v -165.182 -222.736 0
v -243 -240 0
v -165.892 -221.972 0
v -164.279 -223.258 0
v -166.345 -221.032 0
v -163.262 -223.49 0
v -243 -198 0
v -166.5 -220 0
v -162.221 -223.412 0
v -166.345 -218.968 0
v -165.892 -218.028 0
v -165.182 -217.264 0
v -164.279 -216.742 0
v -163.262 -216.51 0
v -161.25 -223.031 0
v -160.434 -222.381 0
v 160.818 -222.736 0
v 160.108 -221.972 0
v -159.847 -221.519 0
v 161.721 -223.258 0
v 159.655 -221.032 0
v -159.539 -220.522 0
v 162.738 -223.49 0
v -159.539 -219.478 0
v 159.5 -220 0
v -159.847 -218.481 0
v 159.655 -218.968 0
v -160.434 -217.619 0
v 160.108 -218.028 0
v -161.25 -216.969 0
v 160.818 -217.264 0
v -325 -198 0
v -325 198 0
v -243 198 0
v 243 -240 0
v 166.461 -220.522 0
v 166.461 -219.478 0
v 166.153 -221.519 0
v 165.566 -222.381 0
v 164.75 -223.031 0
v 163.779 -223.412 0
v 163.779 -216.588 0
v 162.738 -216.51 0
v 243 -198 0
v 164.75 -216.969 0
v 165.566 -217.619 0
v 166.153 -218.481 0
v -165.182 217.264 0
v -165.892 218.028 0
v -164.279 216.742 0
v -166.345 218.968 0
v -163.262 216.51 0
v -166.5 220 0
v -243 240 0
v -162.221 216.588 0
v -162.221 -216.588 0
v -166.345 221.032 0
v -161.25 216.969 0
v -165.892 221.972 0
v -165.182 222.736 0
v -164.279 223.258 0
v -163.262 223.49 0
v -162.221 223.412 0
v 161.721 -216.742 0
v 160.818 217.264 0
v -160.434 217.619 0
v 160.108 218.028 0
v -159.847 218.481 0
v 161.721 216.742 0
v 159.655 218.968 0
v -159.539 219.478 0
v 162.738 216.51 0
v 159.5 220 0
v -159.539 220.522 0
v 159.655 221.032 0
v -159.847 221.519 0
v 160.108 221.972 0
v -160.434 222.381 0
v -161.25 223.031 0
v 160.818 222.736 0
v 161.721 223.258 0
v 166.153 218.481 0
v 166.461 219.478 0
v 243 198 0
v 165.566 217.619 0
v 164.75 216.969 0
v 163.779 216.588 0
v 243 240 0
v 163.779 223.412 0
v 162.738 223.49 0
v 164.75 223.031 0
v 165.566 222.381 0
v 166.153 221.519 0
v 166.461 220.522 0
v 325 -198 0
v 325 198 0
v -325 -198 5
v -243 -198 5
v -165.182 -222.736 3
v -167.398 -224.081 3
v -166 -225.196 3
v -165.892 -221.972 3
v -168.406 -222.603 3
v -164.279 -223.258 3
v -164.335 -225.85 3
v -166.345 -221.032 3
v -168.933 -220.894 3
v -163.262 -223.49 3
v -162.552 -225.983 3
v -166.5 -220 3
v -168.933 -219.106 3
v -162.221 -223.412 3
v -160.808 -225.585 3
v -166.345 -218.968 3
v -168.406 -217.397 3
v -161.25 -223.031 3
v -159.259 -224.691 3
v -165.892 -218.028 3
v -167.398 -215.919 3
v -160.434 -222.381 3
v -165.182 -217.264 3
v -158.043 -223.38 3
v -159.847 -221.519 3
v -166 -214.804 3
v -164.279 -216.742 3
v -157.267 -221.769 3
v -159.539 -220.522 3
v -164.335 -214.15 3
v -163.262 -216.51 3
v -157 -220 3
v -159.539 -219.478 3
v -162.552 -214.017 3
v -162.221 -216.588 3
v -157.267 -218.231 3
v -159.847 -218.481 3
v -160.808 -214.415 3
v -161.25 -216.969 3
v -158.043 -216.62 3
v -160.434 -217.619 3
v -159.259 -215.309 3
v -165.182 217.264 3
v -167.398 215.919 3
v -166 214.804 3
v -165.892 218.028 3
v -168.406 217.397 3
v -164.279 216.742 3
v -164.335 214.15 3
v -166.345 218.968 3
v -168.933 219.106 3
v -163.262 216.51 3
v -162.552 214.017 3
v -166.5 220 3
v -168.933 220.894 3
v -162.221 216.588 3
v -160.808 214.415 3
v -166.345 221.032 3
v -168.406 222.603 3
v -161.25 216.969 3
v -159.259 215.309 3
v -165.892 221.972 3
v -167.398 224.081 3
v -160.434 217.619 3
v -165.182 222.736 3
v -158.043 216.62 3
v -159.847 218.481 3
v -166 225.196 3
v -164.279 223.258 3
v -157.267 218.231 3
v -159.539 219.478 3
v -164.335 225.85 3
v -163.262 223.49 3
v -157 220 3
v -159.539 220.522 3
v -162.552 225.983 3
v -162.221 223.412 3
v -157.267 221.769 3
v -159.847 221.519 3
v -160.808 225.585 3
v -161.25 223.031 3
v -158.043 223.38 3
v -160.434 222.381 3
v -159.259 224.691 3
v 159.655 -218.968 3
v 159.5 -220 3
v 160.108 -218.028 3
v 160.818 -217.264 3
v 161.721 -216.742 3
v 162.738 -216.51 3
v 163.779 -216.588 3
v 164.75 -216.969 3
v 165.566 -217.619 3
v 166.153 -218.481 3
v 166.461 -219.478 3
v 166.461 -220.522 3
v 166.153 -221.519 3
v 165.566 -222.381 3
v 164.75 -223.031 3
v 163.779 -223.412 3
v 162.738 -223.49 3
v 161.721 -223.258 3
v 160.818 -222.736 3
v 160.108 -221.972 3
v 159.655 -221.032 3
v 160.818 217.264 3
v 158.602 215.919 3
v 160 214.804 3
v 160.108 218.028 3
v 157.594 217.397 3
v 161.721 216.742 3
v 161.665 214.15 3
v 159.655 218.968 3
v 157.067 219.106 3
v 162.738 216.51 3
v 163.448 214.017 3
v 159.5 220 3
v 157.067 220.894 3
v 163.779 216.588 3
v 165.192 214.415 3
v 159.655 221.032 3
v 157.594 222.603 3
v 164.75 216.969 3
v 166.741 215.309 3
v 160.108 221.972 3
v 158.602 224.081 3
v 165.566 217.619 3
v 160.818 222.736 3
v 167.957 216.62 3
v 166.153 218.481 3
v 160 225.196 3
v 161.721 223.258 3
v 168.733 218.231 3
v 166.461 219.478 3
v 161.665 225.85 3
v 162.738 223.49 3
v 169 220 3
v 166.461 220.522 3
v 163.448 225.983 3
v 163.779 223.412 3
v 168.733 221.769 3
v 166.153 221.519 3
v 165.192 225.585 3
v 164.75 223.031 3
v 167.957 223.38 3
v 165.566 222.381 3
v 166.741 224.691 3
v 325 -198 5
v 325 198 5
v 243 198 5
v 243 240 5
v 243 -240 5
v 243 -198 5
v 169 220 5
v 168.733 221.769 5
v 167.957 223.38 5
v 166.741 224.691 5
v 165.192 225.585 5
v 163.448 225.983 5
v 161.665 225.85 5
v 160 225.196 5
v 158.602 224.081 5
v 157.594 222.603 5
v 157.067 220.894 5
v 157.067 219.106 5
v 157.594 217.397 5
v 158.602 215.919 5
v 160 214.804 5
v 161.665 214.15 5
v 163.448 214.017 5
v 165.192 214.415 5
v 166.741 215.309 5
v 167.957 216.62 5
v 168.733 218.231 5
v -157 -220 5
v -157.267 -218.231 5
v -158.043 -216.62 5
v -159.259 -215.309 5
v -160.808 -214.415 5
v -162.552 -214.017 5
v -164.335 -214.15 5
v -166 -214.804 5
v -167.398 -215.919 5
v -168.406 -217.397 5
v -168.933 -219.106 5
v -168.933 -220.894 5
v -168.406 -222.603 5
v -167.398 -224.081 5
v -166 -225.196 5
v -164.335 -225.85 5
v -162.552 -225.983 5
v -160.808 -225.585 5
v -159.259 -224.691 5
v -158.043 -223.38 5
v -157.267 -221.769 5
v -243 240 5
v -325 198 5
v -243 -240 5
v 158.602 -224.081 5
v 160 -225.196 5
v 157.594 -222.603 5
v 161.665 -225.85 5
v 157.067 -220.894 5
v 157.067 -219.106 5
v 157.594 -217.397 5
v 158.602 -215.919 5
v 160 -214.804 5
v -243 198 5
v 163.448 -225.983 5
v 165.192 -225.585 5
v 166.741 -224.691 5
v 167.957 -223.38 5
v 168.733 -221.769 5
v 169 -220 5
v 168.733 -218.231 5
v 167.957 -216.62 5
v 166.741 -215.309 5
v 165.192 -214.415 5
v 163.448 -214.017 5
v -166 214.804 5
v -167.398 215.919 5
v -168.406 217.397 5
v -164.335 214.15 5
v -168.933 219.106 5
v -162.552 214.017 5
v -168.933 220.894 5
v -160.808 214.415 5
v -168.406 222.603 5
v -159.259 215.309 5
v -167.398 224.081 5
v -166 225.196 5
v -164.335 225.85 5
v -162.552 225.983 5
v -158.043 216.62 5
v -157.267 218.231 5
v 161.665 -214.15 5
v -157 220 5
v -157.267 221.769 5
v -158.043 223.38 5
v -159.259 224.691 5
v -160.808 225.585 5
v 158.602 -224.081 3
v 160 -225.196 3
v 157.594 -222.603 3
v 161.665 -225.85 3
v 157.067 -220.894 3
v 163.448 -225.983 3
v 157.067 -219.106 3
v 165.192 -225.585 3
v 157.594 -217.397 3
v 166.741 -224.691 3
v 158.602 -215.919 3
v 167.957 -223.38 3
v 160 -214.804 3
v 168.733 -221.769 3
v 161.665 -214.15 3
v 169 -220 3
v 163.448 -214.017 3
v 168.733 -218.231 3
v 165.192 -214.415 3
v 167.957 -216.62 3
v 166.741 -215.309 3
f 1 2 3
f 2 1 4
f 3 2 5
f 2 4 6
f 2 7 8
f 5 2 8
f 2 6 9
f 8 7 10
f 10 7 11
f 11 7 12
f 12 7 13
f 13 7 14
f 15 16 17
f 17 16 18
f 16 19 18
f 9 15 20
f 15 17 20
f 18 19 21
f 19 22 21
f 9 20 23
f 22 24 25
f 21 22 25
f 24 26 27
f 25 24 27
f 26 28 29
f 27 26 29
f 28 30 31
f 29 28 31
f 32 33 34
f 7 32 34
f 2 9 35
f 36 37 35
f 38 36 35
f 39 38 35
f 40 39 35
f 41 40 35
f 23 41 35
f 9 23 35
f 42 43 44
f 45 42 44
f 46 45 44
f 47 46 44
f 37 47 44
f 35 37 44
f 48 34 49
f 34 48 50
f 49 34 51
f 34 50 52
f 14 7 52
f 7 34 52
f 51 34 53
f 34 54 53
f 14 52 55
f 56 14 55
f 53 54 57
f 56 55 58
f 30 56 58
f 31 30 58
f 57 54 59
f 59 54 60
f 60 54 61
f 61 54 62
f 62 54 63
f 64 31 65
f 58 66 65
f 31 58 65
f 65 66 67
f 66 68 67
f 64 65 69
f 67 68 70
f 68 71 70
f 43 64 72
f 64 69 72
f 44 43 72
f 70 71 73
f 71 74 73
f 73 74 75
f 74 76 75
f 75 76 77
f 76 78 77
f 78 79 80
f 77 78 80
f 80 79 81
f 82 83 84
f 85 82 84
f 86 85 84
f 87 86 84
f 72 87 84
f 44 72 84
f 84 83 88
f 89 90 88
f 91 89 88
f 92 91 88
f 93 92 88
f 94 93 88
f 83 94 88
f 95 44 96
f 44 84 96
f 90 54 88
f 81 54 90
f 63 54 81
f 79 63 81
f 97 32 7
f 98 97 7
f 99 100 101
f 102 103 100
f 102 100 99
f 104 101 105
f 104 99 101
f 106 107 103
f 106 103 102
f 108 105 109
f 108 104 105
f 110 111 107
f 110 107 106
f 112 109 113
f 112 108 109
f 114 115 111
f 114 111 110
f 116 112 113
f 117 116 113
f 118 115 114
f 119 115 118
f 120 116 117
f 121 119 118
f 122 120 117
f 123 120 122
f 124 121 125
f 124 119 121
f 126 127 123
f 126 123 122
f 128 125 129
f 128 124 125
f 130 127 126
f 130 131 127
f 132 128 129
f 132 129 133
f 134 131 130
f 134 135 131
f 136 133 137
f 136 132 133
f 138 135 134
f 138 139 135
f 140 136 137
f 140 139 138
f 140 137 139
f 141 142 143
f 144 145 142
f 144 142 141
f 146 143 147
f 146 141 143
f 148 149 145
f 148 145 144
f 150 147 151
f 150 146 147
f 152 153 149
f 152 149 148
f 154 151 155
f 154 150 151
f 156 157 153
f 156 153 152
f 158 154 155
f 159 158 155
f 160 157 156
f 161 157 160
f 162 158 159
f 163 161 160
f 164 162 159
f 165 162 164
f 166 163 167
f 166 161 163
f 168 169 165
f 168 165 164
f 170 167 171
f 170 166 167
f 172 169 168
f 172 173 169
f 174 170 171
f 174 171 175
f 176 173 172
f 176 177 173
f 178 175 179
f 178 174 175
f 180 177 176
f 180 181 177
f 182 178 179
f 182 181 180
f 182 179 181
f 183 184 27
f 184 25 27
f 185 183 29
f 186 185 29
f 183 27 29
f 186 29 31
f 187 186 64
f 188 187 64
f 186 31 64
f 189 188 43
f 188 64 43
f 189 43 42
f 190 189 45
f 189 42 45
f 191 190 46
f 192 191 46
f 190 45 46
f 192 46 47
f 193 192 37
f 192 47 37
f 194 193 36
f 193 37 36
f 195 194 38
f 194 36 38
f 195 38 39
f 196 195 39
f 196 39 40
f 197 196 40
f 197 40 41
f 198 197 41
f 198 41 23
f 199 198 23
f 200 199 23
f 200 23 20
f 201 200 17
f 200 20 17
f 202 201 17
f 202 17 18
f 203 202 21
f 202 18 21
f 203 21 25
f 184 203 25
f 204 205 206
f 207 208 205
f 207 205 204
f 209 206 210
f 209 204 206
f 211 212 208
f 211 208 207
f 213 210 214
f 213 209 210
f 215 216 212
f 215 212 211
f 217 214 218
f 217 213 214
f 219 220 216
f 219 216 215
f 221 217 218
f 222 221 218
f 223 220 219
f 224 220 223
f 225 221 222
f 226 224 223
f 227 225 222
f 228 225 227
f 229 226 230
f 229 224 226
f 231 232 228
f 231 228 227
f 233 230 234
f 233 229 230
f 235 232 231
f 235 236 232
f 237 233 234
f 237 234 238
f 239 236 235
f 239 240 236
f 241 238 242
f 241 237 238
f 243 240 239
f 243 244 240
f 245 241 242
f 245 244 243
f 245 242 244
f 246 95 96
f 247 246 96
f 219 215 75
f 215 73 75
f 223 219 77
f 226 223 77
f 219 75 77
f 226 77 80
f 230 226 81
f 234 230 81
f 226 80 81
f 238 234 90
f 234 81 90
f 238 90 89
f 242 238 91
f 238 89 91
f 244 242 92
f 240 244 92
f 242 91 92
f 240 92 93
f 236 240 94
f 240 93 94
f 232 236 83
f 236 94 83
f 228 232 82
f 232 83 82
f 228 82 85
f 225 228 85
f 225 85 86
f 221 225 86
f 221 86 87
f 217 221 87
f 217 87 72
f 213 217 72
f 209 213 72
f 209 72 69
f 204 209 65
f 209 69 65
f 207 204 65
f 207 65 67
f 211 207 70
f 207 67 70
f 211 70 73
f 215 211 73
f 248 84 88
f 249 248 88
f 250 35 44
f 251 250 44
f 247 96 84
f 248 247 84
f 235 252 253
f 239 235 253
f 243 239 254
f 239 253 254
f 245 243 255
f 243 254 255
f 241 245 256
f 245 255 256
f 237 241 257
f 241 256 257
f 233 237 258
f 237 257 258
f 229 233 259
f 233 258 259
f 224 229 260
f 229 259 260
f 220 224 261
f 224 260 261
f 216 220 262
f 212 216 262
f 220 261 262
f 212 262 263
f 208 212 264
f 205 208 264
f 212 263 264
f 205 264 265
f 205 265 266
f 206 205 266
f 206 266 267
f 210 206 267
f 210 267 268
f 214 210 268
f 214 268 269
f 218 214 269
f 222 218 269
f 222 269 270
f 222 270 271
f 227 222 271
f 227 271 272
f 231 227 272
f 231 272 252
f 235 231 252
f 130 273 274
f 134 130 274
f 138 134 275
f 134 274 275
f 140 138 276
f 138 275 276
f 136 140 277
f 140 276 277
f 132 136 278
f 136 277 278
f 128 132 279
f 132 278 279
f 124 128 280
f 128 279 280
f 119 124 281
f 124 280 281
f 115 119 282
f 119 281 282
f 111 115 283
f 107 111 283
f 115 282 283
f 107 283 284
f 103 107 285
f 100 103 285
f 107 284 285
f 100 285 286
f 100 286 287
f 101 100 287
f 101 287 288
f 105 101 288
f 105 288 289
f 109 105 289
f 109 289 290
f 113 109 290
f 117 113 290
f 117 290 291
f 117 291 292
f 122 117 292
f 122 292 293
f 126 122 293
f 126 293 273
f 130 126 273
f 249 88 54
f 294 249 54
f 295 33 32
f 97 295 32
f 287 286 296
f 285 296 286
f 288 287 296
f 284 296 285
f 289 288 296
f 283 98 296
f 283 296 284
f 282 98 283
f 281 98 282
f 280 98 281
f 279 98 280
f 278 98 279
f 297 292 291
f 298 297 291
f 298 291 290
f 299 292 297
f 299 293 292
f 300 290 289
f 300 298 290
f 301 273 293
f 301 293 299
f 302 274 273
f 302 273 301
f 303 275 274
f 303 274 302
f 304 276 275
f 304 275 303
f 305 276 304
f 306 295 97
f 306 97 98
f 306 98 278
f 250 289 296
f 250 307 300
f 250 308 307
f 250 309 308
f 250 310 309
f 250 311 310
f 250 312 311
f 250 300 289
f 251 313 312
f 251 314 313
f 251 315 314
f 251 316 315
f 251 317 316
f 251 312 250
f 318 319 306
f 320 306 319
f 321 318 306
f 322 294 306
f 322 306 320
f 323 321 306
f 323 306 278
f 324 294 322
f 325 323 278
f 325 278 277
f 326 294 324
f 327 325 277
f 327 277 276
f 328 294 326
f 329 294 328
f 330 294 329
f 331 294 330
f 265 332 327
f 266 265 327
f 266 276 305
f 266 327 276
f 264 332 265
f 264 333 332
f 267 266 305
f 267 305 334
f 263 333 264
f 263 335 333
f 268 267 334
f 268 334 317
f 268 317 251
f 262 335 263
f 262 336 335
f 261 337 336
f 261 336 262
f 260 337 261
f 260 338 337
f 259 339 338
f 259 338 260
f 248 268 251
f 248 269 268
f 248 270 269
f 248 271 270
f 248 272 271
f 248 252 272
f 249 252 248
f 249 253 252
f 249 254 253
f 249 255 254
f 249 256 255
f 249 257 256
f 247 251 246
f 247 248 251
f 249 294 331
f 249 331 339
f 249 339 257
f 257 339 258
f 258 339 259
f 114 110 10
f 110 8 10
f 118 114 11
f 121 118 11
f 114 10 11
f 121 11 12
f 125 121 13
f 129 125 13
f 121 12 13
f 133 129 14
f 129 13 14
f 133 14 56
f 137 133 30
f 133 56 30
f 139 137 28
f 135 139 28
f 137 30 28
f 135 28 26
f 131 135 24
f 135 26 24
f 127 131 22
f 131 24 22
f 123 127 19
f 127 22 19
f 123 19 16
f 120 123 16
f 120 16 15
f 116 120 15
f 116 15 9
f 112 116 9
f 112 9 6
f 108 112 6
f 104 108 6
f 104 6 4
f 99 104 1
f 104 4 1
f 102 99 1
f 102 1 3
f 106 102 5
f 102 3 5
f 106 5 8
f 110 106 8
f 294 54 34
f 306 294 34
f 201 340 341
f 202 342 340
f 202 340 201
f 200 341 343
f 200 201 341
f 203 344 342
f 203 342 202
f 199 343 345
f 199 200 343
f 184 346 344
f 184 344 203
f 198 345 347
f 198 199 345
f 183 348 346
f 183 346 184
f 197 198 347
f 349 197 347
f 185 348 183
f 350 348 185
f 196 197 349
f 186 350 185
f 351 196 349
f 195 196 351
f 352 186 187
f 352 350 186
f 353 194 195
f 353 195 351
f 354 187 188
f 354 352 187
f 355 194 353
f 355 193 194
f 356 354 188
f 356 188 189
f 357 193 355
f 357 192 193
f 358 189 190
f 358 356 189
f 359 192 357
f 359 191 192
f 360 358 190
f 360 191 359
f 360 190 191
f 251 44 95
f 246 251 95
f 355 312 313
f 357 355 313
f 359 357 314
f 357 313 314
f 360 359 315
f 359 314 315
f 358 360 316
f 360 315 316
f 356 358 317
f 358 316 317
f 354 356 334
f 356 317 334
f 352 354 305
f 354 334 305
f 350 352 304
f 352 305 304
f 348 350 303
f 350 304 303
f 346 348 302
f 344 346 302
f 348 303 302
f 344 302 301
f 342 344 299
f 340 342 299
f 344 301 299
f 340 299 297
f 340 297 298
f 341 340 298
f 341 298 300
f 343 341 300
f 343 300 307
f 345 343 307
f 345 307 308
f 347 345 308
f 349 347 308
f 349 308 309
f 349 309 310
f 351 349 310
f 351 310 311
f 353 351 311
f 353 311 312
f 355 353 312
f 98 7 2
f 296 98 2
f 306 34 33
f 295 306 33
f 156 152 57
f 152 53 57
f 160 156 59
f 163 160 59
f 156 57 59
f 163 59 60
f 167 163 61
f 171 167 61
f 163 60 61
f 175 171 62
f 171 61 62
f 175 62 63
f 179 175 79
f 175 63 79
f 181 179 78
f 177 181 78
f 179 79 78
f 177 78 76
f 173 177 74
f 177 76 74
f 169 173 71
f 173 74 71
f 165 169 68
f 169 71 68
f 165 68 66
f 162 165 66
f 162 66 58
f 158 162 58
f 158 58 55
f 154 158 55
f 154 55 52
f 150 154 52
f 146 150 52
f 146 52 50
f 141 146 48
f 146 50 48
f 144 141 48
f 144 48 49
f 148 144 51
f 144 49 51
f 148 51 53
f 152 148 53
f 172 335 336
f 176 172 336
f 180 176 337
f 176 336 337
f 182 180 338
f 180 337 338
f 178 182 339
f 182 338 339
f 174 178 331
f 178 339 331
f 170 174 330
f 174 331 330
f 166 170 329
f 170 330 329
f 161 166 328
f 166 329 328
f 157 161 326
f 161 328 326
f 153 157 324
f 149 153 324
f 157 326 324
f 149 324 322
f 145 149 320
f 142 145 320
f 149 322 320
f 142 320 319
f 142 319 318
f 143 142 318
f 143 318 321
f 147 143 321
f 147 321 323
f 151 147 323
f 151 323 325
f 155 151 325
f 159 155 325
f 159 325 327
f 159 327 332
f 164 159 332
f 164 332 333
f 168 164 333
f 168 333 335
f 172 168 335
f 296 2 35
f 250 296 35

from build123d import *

# Parameters (mm, degrees)
F1_DEPTH       = 5
F3_D           = 7
F3_CBORE_D     = 12
F3_CBORE_DEPTH = 2


with BuildPart() as f1:
    # F0 (on Top) → F1 (new body)
    with BuildSketch(Plane.XY):
        Polygon((243, 240), (-243, 240), (-243, 198), (-325, 198), (-325, -198), (-243, -198), (-243, -240), (243, -240), (243, -198), (325, -198), (325, 198), (243, 198), align=None)
    extrude(amount=F1_DEPTH)

    # F3 (through all)
    with Locations(Plane.XY.offset(5)):
        with Locations((-163, 220), (-163, -220), (163, -220), (163, 220)):
            CounterBoreHole(F3_D / 2, F3_CBORE_D / 2, F3_CBORE_DEPTH)


solid = f1.part
